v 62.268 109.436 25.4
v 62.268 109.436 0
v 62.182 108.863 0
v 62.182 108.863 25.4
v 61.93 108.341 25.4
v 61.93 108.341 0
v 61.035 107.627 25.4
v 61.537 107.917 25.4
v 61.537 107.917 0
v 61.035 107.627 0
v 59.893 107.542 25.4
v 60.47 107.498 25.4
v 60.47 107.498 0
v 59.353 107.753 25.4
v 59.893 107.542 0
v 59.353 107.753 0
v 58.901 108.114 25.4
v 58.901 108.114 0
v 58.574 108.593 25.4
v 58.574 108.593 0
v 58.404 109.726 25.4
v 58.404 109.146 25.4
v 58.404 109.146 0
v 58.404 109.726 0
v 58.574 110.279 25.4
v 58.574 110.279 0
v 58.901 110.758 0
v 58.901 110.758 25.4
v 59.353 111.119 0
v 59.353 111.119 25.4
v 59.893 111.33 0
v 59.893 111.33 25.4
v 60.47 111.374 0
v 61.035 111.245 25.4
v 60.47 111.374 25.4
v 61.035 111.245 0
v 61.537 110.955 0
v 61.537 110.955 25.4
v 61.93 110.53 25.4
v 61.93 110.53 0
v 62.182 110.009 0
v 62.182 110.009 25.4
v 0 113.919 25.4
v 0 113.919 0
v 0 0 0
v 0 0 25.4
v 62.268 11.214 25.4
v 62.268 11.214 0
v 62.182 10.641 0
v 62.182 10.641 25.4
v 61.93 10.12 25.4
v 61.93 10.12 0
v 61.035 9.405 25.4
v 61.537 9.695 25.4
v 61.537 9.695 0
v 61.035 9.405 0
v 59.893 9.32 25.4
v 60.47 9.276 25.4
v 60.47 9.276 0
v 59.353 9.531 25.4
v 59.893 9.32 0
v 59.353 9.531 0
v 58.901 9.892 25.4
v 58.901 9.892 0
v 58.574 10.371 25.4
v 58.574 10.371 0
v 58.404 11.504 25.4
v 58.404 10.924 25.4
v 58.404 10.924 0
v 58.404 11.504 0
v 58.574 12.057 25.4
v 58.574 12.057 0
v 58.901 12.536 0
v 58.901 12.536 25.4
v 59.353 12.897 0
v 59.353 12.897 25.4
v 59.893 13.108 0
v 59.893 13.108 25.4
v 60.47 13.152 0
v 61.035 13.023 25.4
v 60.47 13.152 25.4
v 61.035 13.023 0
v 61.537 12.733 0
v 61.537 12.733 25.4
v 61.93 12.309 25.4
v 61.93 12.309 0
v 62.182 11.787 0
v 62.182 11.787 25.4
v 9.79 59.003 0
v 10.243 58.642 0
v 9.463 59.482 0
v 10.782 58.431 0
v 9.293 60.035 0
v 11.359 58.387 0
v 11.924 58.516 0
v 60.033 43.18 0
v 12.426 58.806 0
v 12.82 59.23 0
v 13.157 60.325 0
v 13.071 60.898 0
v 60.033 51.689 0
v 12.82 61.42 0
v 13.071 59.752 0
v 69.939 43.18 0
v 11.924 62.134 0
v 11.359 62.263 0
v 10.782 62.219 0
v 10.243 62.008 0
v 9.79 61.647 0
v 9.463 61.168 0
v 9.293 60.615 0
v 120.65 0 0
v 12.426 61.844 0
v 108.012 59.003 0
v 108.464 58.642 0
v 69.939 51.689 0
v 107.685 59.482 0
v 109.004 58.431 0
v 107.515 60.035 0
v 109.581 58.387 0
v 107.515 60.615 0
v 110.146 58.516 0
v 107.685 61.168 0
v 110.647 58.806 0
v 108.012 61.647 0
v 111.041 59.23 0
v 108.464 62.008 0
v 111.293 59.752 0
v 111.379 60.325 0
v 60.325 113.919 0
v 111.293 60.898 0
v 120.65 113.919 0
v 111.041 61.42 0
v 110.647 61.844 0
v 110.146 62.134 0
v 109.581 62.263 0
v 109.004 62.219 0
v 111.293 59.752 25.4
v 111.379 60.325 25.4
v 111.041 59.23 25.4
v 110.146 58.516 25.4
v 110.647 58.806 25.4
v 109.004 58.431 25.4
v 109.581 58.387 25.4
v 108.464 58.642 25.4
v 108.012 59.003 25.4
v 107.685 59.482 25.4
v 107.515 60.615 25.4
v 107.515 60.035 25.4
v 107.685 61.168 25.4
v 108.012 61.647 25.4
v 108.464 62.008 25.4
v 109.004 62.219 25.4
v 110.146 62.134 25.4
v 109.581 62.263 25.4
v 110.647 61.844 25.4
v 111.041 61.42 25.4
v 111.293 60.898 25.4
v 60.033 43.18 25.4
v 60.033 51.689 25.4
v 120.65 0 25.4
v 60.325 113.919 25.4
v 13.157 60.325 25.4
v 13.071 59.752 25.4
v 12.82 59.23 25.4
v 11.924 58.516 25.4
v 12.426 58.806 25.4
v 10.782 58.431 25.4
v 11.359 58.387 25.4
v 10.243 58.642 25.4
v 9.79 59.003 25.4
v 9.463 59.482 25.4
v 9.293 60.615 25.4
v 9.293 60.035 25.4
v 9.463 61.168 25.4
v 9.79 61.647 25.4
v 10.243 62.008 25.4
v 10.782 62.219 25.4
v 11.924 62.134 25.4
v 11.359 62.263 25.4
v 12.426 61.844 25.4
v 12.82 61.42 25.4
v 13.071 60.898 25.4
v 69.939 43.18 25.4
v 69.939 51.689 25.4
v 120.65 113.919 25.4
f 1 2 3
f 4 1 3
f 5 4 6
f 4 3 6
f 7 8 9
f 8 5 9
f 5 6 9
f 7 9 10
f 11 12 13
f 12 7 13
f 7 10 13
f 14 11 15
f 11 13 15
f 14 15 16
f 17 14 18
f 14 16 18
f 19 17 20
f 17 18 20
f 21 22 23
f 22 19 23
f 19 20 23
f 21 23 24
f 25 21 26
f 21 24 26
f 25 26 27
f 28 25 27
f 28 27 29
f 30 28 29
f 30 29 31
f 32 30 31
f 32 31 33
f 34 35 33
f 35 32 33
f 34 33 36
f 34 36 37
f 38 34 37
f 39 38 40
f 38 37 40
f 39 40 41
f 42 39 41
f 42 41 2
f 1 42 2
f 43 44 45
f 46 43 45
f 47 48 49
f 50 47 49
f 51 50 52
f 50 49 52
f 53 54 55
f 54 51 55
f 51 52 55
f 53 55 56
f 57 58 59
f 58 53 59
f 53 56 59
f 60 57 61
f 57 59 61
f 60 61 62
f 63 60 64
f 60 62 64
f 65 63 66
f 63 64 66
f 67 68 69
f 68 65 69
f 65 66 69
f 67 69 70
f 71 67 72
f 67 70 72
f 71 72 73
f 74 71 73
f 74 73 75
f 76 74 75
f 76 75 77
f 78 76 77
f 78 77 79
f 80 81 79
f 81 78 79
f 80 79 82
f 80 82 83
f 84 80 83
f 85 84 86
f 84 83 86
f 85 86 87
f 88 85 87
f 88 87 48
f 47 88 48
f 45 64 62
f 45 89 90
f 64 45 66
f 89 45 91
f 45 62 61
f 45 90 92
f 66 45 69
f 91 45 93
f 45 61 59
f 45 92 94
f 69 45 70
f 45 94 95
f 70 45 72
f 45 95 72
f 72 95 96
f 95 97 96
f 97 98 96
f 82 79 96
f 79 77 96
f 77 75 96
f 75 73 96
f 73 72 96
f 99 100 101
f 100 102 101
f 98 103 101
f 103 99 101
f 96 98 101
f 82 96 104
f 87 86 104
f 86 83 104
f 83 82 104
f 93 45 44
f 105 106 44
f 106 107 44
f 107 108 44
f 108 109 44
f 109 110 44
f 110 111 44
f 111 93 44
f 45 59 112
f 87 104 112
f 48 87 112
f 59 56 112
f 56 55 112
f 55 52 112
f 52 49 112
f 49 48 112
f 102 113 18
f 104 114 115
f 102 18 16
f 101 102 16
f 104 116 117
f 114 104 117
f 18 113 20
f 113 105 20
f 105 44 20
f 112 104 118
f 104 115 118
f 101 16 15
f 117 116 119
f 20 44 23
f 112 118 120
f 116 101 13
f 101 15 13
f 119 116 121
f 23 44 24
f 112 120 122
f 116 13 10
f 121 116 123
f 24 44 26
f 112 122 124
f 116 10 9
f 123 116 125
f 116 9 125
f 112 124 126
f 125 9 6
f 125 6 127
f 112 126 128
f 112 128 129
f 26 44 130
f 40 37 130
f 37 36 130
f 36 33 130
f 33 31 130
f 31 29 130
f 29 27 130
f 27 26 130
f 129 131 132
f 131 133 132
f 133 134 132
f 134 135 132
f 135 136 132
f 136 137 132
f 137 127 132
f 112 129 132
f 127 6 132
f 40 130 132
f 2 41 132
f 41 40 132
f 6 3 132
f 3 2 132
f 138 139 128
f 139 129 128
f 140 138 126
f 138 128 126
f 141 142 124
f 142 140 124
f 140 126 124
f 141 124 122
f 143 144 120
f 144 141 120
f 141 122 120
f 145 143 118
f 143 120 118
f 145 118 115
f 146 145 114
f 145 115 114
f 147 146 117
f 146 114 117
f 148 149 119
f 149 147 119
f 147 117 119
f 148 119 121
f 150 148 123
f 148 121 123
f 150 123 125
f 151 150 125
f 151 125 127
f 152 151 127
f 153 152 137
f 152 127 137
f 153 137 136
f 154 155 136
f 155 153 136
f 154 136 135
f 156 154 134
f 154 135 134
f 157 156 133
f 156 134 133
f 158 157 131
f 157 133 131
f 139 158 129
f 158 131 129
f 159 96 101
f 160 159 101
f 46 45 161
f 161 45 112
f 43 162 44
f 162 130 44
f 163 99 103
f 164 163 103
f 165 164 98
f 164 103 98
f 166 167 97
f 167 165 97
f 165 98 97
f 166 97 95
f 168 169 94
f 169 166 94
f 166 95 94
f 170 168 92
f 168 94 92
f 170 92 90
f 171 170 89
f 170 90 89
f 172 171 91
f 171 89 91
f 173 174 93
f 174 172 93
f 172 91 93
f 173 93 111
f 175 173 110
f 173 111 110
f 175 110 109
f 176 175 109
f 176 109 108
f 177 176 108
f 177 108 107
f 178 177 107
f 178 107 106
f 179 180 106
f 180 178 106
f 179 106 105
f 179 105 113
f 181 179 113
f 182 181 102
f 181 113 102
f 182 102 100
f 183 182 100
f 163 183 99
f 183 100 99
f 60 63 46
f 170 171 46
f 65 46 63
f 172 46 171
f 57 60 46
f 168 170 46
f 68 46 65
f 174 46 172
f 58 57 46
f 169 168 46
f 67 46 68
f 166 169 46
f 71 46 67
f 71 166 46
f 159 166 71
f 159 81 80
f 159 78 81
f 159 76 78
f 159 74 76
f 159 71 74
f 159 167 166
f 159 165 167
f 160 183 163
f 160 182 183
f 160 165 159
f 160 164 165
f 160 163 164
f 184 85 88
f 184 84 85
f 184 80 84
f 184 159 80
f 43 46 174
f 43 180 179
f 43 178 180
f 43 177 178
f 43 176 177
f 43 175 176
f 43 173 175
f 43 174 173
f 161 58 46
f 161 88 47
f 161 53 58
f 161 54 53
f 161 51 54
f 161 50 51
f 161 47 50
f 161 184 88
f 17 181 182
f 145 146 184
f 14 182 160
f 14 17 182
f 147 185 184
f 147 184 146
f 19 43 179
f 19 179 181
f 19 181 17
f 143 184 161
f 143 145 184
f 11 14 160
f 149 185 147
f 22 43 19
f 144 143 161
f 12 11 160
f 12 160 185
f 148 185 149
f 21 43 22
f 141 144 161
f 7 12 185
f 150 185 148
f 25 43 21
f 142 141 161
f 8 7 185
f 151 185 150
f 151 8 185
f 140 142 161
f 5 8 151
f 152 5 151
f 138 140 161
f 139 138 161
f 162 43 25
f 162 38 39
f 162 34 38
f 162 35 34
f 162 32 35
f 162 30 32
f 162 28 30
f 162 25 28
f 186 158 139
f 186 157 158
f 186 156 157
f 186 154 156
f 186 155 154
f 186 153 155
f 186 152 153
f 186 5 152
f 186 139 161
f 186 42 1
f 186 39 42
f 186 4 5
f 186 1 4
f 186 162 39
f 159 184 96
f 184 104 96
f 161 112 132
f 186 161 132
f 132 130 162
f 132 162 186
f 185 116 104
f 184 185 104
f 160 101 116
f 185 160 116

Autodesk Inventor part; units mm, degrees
ref_plane "YZ Plane" through (0, 0, 0) normal (1, 0, 0) x (0, 1, 0)
ref_plane "XZ Plane" through (0, 0, 0) normal (0, 1, 0) x (-1, 0, 0)
ref_plane "XY Plane" through (0, 0, 0) normal (0, 0, 1) x (1, 0, 0)
sketch "Sketch1" plane through (0, 0, 0) normal (0, 0, 1) x (1, 0, 0)
  line L0 (0, 0) -> (120.65, 0)
  line L1 (120.65, 0) -> (120.65, 113.919)
  line L2 (0, 113.919) -> (0, 0)
  circle A0 centre (11.2141, 60.325) radius 1.9431
  circle A1 centre (60.325, 11.2141) radius 1.9431
  circle A2 centre (109.4359, 60.325) radius 1.9431
  circle A3 centre (60.325, 109.4359) radius 1.9431
  line L3 (60.325, 113.919) -> (120.65, 113.919)
  line L4 (60.325, 113.919) -> (0, 113.919)
  line L5 (60.0329, 51.689) -> (69.9389, 51.689)
  line L6 (69.9389, 51.689) -> (69.9389, 43.18)
  line L7 (69.9389, 43.18) -> (60.0329, 43.18)
  line L8 (60.0329, 43.18) -> (60.0329, 51.689)
  point P0 (60.325, 60.325)
  dimension "d10" = 3.8862
  dimension "d13" = 360
  dimension "d34" = 9.906
  dimension "d35" = 8.509
extrude "Extrusion4" add sketch "Sketch1" along normal blind 25.4
properties part number "speakerfront2"
